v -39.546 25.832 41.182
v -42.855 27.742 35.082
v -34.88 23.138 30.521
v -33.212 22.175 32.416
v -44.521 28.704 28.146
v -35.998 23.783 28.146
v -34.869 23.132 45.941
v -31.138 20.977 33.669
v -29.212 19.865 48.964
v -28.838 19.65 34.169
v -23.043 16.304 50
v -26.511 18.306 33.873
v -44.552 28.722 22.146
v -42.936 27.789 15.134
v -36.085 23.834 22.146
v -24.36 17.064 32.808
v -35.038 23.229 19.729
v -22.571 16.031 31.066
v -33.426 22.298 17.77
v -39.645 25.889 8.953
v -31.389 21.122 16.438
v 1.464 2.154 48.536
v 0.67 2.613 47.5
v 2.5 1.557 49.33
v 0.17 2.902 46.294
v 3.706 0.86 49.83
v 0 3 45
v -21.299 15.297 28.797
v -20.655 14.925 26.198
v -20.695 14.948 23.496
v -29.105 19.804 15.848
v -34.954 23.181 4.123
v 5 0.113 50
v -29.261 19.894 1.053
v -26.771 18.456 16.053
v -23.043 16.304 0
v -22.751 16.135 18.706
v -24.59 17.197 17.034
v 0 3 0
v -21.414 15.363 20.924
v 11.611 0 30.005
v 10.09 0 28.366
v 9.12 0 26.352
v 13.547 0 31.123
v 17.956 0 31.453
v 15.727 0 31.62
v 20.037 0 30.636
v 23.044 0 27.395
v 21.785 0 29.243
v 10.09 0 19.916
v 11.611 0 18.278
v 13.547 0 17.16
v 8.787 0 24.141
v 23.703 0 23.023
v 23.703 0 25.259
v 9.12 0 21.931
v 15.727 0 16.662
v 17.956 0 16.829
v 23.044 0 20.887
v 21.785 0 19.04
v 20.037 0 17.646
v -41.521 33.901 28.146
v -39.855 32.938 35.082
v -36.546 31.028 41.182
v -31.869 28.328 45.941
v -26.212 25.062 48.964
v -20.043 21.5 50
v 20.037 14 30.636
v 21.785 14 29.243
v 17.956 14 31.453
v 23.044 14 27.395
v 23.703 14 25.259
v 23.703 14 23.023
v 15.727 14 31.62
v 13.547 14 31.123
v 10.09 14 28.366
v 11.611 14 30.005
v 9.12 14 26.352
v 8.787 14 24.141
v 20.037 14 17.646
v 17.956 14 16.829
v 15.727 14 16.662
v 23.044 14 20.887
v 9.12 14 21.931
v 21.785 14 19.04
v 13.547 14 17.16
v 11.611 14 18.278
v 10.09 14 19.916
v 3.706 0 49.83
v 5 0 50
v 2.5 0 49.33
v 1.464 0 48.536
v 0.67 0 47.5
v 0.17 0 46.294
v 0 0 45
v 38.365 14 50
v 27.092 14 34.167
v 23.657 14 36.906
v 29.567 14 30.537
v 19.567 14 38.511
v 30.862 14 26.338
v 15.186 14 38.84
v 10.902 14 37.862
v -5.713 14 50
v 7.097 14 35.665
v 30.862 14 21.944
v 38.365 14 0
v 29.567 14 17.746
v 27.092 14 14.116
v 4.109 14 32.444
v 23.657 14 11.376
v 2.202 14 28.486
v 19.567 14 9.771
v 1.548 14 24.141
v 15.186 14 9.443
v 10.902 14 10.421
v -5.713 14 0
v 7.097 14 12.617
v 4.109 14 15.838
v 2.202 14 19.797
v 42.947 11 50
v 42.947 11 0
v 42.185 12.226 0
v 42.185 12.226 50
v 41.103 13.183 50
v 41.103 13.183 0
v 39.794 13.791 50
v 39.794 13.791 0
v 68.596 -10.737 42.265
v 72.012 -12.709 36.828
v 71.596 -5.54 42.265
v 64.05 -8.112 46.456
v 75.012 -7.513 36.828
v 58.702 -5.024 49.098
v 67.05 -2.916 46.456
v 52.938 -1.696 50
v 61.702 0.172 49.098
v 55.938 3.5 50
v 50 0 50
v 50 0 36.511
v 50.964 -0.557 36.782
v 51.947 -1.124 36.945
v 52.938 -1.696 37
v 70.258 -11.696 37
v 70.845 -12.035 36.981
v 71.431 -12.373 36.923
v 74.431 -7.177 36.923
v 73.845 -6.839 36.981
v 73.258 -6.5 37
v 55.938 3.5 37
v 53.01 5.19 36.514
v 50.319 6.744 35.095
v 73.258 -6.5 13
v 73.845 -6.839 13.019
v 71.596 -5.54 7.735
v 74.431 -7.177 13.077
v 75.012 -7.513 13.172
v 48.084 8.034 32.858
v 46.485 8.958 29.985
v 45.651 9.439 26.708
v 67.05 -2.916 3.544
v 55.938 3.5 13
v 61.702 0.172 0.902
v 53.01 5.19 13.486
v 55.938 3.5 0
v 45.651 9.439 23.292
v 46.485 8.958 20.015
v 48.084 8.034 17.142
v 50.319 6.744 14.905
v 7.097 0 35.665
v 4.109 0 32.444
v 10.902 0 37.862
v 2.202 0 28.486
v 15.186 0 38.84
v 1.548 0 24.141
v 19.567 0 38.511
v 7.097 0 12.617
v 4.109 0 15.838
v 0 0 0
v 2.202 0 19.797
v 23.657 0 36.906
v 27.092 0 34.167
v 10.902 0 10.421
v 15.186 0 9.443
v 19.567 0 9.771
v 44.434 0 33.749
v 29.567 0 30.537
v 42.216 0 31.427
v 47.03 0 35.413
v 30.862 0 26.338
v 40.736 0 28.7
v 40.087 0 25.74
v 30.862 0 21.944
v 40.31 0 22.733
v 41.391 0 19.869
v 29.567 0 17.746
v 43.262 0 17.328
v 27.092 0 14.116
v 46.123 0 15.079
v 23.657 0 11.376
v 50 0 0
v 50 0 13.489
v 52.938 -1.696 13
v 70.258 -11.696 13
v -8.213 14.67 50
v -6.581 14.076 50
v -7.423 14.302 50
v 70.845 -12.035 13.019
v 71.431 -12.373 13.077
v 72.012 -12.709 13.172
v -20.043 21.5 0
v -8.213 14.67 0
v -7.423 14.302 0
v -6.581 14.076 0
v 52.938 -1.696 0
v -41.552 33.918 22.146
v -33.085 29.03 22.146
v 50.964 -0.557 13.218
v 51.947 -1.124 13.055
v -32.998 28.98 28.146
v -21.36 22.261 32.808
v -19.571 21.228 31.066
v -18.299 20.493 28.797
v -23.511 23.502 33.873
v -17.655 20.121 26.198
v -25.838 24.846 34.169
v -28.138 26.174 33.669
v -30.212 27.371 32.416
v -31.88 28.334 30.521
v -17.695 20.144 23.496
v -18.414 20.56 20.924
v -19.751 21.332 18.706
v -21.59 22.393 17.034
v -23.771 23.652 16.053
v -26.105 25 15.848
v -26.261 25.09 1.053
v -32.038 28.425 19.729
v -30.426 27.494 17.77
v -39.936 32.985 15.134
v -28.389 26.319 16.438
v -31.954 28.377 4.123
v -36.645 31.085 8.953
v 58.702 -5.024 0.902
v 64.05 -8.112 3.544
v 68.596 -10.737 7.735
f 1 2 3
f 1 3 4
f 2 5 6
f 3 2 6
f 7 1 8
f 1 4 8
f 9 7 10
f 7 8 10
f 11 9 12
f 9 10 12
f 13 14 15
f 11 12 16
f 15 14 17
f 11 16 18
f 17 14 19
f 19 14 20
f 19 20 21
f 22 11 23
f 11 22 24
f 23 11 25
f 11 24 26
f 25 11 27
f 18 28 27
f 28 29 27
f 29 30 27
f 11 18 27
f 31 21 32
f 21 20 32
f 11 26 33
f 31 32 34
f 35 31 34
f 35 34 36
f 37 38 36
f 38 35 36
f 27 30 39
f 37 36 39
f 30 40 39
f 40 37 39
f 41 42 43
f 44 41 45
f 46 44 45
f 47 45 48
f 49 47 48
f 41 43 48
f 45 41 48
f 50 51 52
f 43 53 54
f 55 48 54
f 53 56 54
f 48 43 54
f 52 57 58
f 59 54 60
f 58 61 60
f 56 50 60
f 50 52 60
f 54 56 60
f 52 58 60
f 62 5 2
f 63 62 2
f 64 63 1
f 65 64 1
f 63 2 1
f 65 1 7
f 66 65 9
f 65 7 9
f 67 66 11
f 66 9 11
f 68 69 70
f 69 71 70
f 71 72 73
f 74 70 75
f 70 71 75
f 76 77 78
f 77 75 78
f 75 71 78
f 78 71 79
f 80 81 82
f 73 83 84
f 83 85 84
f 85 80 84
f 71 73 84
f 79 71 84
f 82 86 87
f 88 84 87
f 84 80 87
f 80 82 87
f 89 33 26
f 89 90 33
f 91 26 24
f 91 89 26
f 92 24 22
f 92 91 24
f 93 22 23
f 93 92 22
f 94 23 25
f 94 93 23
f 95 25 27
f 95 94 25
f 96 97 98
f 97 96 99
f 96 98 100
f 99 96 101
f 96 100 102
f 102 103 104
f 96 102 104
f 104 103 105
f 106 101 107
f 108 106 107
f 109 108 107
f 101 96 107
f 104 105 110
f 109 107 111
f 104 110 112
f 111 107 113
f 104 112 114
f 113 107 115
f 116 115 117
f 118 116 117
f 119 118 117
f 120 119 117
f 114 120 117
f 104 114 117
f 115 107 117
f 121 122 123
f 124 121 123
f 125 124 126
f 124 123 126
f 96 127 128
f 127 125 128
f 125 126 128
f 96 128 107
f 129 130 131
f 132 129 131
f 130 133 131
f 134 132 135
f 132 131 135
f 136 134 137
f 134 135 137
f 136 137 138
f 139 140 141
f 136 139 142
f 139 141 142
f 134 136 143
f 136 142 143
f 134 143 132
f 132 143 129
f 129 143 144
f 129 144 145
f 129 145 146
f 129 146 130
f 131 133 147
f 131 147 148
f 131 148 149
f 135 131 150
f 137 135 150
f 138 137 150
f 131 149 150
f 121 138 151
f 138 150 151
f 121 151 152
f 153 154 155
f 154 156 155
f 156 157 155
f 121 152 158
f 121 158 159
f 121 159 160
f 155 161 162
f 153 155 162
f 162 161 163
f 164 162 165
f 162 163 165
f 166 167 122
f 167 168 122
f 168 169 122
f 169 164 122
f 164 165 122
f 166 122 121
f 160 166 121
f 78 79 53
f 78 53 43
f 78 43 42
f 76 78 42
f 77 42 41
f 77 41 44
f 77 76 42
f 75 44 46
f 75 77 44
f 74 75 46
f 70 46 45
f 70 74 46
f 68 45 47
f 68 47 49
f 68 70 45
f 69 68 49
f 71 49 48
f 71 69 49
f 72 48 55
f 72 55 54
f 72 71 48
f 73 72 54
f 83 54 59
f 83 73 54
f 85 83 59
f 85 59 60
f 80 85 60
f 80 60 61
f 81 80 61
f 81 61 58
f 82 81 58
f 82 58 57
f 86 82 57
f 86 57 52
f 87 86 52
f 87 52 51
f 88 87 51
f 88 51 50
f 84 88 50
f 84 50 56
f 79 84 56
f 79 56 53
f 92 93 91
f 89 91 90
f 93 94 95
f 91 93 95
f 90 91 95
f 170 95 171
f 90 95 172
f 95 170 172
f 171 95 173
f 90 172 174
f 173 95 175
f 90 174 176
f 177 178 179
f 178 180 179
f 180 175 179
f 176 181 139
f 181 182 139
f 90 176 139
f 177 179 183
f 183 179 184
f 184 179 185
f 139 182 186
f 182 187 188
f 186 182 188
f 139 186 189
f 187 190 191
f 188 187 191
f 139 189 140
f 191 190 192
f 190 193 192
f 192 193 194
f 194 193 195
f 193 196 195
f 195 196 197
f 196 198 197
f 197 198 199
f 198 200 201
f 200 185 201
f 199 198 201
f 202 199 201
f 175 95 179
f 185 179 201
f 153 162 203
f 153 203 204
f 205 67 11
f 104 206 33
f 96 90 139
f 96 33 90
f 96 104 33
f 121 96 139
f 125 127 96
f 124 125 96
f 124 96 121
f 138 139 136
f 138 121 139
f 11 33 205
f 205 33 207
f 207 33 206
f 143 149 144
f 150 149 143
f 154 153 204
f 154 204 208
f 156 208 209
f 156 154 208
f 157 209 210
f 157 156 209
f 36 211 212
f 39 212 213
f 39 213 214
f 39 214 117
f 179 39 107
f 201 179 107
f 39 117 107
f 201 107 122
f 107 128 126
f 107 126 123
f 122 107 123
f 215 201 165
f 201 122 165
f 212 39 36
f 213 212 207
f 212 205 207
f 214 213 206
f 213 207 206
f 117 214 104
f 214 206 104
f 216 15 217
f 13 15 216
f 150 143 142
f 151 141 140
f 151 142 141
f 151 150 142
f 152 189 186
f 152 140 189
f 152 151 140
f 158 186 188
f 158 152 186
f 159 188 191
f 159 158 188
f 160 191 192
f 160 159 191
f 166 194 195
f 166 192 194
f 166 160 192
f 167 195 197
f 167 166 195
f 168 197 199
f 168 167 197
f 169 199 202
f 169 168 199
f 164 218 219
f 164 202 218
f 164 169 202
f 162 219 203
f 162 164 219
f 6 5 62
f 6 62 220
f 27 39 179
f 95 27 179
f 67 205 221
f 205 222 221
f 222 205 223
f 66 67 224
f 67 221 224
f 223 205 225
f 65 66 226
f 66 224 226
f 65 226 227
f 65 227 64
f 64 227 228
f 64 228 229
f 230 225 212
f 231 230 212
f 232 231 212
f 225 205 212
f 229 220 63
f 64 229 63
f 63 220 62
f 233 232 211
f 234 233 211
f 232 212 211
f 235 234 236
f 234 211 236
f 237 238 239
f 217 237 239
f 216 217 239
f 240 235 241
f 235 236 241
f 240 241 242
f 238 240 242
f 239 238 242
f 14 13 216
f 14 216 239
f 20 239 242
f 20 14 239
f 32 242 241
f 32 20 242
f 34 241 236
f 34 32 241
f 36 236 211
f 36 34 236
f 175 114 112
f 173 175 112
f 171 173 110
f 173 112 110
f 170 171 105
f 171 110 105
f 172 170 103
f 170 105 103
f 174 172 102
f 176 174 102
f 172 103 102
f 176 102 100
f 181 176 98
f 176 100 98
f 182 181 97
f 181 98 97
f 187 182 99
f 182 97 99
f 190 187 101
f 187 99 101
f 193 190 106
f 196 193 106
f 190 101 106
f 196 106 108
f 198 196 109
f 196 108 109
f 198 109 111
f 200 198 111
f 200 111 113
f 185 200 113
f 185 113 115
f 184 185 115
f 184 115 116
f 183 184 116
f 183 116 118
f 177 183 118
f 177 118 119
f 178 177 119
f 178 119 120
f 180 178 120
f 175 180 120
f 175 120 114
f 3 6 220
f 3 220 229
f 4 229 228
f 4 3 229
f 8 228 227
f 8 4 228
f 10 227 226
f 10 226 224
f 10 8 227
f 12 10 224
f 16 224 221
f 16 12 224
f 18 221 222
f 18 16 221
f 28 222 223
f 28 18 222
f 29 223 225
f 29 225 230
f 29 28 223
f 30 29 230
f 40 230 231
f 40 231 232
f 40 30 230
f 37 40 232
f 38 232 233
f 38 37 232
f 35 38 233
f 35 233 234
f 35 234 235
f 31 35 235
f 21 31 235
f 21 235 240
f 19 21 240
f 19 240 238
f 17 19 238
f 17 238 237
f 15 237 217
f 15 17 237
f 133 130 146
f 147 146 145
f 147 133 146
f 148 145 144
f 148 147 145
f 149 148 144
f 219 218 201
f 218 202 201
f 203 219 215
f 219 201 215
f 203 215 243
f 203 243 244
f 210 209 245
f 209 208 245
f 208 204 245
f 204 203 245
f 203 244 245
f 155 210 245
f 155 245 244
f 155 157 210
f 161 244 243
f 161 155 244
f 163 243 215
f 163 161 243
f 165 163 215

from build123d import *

# Parameters (mm, degrees)
BOSS_EXTRUDE1_DEPTH = 50
FILLET1_R           = 25
FILLET2_R           = 5
FILLET3_R           = 5
CUT_EXTRUDE1_START  = -6
CUT_EXTRUDE1_DEPTH  = 6
SKETCH3_R           = 14.739524533
SKETCH3_R_2         = 7.5
CUT_EXTRUDE2_DEPTH  = 50
CUT_EXTRUDE3_DEPTH  = 50


# Read off the part's stored shape, not the designer's step: Cut-Extrude1
# Some blends are built 0.0001 mm under size
with BuildPart() as part:
    # Sketch1 → Boss-Extrude1 (new body)
    with BuildSketch(Plane.XY):
        Polygon((0, 0), (50, 0), (74.588457268, -14.196152423), (77.588457268, -9), (42.947441117, 11), (42.947441117, 14), (-7.052558883, 14), (-41.693575035, 34), (-44.693575035, 28.803847577), (0, 3), align=None)
    extrude(amount=BOSS_EXTRUDE1_DEPTH)

    # Fillet1
    fillet1_edges = [part.edges().sort_by_distance(p)[0] for p in [
        (76.088457268, -11.598076211, 0),
        (76.088457268, -11.598076211, 50),
        (-43.193575035, 31.401923789, 0),
        (-43.193575035, 31.401923789, 50),
    ]]
    fillet(fillet1_edges, radius=FILLET1_R - 0.0001)  # a hair under: the kernel refuses the full size

    # Fillet2
    # the kernel refuses this fillet: 5 mm, written as the material it takes off along each edge
    with BuildSketch(Plane(origin=(42.947441117, 14, -11.456439237), x_dir=(0, -1, 0), z_dir=(0, 0, 1))) as fillet2_piece_1:
        with BuildLine():
            CenterArc((5, -4.582575695), FILLET2_R, 113.578178478, 66.421821522)
            Line((0, -4.582575695), (-0.1, -4.582575695))
            Line((-0.1, -4.582575695), (-0.1, 0))
            Line((-0.1, 0), (0, 0.1))
            ThreePointArc((0, 0.1), (1.5, 0.1), (2.96, 0.091651514))
            Line((2.96, 0.091651514), (3, 0))
        make_face()
    extrude(amount=72.912878475, mode=Mode.SUBTRACT)

    # Fillet3
    fillet3_edges = [part.edges().sort_by_distance(p)[0] for p in [
        (-7.052558883, 14, 25),
        (0, 1.5, 50),
    ]]
    fillet(fillet3_edges, radius=FILLET3_R)

    # Cut-Extrude1 outline → Cut-Extrude1 (cut)
    with BuildSketch(Plane(origin=(4.299038106, 7.446152423, 0), x_dir=(0.8660254037844423, -0.4999999999999939, 0), z_dir=(0.4999999999999939, 0.8660254037844423, 0)).offset(CUT_EXTRUDE1_START)):
        with BuildLine():
            Line((-54, -28.145870627), (-43.066723537, -28.145870627))
            ThreePointArc((-43.066723537, -28.145870627), (-25.273308711, -24.845643163), (-43.167674884, -22.145870627))
            Line((-43.167674884, -22.145870627), (-54, -22.145870627))
            Line((-54, -22.145870627), (-54, -28.145870627))
        make_face()
    extrude(amount=CUT_EXTRUDE1_DEPTH, mode=Mode.SUBTRACT)

    # Sketch3 → Cut-Extrude2 (cut)
    with BuildSketch(Plane(origin=(0, 14, 0), x_dir=(1, 0, 0), z_dir=(0, 1, 0))):
        with Locations(Location((16.287187079, -24.141274019, 0), (0, 0, 180))):
            Circle(SKETCH3_R)
        with Locations(Location((16.287187079, -24.141274019, 0), (0, 0, 180))):
            Circle(SKETCH3_R_2, mode=Mode.SUBTRACT)
    extrude(amount=-CUT_EXTRUDE2_DEPTH, mode=Mode.SUBTRACT)


with BuildPart() as cut_extrude2_piece_1:
    # of the separate pieces the step leaves, piece 1, a body of its own (cut_extrude2_pieces)
    add(part.part.solids().sort_by_distance((-8.212812921, 14.669872981, 0))[0])

    # Sketch4 → Cut-Extrude3 (cut)
    with BuildSketch(Plane(origin=(15.5, 26.846787517, 0), x_dir=(0.8660254037844423, -0.49999999999999384, 0), z_dir=(0.49999999999999384, 0.8660254037844423, 0))):
        with BuildLine():
            Line((46.693575035, -13), (66.693575035, -13))
            ThreePointArc((66.693575035, -13), (78.693575035, -25), (66.693575035, -37))
            Line((66.693575035, -37), (46.693575035, -37))
            ThreePointArc((46.693575035, -37), (34.693575035, -25), (46.693575035, -13))
        make_face()
    extrude(amount=-CUT_EXTRUDE3_DEPTH, mode=Mode.SUBTRACT)


with BuildPart() as cut_extrude2_piece_2:
    # of the separate pieces the step leaves, piece 2, a body of its own (cut_extrude2_pieces)
    add(part.part.solids().sort_by_distance((8.787187079, 14, 24.141274019))[0])


solid = Compound([cut_extrude2_piece_1.part, cut_extrude2_piece_2.part])
